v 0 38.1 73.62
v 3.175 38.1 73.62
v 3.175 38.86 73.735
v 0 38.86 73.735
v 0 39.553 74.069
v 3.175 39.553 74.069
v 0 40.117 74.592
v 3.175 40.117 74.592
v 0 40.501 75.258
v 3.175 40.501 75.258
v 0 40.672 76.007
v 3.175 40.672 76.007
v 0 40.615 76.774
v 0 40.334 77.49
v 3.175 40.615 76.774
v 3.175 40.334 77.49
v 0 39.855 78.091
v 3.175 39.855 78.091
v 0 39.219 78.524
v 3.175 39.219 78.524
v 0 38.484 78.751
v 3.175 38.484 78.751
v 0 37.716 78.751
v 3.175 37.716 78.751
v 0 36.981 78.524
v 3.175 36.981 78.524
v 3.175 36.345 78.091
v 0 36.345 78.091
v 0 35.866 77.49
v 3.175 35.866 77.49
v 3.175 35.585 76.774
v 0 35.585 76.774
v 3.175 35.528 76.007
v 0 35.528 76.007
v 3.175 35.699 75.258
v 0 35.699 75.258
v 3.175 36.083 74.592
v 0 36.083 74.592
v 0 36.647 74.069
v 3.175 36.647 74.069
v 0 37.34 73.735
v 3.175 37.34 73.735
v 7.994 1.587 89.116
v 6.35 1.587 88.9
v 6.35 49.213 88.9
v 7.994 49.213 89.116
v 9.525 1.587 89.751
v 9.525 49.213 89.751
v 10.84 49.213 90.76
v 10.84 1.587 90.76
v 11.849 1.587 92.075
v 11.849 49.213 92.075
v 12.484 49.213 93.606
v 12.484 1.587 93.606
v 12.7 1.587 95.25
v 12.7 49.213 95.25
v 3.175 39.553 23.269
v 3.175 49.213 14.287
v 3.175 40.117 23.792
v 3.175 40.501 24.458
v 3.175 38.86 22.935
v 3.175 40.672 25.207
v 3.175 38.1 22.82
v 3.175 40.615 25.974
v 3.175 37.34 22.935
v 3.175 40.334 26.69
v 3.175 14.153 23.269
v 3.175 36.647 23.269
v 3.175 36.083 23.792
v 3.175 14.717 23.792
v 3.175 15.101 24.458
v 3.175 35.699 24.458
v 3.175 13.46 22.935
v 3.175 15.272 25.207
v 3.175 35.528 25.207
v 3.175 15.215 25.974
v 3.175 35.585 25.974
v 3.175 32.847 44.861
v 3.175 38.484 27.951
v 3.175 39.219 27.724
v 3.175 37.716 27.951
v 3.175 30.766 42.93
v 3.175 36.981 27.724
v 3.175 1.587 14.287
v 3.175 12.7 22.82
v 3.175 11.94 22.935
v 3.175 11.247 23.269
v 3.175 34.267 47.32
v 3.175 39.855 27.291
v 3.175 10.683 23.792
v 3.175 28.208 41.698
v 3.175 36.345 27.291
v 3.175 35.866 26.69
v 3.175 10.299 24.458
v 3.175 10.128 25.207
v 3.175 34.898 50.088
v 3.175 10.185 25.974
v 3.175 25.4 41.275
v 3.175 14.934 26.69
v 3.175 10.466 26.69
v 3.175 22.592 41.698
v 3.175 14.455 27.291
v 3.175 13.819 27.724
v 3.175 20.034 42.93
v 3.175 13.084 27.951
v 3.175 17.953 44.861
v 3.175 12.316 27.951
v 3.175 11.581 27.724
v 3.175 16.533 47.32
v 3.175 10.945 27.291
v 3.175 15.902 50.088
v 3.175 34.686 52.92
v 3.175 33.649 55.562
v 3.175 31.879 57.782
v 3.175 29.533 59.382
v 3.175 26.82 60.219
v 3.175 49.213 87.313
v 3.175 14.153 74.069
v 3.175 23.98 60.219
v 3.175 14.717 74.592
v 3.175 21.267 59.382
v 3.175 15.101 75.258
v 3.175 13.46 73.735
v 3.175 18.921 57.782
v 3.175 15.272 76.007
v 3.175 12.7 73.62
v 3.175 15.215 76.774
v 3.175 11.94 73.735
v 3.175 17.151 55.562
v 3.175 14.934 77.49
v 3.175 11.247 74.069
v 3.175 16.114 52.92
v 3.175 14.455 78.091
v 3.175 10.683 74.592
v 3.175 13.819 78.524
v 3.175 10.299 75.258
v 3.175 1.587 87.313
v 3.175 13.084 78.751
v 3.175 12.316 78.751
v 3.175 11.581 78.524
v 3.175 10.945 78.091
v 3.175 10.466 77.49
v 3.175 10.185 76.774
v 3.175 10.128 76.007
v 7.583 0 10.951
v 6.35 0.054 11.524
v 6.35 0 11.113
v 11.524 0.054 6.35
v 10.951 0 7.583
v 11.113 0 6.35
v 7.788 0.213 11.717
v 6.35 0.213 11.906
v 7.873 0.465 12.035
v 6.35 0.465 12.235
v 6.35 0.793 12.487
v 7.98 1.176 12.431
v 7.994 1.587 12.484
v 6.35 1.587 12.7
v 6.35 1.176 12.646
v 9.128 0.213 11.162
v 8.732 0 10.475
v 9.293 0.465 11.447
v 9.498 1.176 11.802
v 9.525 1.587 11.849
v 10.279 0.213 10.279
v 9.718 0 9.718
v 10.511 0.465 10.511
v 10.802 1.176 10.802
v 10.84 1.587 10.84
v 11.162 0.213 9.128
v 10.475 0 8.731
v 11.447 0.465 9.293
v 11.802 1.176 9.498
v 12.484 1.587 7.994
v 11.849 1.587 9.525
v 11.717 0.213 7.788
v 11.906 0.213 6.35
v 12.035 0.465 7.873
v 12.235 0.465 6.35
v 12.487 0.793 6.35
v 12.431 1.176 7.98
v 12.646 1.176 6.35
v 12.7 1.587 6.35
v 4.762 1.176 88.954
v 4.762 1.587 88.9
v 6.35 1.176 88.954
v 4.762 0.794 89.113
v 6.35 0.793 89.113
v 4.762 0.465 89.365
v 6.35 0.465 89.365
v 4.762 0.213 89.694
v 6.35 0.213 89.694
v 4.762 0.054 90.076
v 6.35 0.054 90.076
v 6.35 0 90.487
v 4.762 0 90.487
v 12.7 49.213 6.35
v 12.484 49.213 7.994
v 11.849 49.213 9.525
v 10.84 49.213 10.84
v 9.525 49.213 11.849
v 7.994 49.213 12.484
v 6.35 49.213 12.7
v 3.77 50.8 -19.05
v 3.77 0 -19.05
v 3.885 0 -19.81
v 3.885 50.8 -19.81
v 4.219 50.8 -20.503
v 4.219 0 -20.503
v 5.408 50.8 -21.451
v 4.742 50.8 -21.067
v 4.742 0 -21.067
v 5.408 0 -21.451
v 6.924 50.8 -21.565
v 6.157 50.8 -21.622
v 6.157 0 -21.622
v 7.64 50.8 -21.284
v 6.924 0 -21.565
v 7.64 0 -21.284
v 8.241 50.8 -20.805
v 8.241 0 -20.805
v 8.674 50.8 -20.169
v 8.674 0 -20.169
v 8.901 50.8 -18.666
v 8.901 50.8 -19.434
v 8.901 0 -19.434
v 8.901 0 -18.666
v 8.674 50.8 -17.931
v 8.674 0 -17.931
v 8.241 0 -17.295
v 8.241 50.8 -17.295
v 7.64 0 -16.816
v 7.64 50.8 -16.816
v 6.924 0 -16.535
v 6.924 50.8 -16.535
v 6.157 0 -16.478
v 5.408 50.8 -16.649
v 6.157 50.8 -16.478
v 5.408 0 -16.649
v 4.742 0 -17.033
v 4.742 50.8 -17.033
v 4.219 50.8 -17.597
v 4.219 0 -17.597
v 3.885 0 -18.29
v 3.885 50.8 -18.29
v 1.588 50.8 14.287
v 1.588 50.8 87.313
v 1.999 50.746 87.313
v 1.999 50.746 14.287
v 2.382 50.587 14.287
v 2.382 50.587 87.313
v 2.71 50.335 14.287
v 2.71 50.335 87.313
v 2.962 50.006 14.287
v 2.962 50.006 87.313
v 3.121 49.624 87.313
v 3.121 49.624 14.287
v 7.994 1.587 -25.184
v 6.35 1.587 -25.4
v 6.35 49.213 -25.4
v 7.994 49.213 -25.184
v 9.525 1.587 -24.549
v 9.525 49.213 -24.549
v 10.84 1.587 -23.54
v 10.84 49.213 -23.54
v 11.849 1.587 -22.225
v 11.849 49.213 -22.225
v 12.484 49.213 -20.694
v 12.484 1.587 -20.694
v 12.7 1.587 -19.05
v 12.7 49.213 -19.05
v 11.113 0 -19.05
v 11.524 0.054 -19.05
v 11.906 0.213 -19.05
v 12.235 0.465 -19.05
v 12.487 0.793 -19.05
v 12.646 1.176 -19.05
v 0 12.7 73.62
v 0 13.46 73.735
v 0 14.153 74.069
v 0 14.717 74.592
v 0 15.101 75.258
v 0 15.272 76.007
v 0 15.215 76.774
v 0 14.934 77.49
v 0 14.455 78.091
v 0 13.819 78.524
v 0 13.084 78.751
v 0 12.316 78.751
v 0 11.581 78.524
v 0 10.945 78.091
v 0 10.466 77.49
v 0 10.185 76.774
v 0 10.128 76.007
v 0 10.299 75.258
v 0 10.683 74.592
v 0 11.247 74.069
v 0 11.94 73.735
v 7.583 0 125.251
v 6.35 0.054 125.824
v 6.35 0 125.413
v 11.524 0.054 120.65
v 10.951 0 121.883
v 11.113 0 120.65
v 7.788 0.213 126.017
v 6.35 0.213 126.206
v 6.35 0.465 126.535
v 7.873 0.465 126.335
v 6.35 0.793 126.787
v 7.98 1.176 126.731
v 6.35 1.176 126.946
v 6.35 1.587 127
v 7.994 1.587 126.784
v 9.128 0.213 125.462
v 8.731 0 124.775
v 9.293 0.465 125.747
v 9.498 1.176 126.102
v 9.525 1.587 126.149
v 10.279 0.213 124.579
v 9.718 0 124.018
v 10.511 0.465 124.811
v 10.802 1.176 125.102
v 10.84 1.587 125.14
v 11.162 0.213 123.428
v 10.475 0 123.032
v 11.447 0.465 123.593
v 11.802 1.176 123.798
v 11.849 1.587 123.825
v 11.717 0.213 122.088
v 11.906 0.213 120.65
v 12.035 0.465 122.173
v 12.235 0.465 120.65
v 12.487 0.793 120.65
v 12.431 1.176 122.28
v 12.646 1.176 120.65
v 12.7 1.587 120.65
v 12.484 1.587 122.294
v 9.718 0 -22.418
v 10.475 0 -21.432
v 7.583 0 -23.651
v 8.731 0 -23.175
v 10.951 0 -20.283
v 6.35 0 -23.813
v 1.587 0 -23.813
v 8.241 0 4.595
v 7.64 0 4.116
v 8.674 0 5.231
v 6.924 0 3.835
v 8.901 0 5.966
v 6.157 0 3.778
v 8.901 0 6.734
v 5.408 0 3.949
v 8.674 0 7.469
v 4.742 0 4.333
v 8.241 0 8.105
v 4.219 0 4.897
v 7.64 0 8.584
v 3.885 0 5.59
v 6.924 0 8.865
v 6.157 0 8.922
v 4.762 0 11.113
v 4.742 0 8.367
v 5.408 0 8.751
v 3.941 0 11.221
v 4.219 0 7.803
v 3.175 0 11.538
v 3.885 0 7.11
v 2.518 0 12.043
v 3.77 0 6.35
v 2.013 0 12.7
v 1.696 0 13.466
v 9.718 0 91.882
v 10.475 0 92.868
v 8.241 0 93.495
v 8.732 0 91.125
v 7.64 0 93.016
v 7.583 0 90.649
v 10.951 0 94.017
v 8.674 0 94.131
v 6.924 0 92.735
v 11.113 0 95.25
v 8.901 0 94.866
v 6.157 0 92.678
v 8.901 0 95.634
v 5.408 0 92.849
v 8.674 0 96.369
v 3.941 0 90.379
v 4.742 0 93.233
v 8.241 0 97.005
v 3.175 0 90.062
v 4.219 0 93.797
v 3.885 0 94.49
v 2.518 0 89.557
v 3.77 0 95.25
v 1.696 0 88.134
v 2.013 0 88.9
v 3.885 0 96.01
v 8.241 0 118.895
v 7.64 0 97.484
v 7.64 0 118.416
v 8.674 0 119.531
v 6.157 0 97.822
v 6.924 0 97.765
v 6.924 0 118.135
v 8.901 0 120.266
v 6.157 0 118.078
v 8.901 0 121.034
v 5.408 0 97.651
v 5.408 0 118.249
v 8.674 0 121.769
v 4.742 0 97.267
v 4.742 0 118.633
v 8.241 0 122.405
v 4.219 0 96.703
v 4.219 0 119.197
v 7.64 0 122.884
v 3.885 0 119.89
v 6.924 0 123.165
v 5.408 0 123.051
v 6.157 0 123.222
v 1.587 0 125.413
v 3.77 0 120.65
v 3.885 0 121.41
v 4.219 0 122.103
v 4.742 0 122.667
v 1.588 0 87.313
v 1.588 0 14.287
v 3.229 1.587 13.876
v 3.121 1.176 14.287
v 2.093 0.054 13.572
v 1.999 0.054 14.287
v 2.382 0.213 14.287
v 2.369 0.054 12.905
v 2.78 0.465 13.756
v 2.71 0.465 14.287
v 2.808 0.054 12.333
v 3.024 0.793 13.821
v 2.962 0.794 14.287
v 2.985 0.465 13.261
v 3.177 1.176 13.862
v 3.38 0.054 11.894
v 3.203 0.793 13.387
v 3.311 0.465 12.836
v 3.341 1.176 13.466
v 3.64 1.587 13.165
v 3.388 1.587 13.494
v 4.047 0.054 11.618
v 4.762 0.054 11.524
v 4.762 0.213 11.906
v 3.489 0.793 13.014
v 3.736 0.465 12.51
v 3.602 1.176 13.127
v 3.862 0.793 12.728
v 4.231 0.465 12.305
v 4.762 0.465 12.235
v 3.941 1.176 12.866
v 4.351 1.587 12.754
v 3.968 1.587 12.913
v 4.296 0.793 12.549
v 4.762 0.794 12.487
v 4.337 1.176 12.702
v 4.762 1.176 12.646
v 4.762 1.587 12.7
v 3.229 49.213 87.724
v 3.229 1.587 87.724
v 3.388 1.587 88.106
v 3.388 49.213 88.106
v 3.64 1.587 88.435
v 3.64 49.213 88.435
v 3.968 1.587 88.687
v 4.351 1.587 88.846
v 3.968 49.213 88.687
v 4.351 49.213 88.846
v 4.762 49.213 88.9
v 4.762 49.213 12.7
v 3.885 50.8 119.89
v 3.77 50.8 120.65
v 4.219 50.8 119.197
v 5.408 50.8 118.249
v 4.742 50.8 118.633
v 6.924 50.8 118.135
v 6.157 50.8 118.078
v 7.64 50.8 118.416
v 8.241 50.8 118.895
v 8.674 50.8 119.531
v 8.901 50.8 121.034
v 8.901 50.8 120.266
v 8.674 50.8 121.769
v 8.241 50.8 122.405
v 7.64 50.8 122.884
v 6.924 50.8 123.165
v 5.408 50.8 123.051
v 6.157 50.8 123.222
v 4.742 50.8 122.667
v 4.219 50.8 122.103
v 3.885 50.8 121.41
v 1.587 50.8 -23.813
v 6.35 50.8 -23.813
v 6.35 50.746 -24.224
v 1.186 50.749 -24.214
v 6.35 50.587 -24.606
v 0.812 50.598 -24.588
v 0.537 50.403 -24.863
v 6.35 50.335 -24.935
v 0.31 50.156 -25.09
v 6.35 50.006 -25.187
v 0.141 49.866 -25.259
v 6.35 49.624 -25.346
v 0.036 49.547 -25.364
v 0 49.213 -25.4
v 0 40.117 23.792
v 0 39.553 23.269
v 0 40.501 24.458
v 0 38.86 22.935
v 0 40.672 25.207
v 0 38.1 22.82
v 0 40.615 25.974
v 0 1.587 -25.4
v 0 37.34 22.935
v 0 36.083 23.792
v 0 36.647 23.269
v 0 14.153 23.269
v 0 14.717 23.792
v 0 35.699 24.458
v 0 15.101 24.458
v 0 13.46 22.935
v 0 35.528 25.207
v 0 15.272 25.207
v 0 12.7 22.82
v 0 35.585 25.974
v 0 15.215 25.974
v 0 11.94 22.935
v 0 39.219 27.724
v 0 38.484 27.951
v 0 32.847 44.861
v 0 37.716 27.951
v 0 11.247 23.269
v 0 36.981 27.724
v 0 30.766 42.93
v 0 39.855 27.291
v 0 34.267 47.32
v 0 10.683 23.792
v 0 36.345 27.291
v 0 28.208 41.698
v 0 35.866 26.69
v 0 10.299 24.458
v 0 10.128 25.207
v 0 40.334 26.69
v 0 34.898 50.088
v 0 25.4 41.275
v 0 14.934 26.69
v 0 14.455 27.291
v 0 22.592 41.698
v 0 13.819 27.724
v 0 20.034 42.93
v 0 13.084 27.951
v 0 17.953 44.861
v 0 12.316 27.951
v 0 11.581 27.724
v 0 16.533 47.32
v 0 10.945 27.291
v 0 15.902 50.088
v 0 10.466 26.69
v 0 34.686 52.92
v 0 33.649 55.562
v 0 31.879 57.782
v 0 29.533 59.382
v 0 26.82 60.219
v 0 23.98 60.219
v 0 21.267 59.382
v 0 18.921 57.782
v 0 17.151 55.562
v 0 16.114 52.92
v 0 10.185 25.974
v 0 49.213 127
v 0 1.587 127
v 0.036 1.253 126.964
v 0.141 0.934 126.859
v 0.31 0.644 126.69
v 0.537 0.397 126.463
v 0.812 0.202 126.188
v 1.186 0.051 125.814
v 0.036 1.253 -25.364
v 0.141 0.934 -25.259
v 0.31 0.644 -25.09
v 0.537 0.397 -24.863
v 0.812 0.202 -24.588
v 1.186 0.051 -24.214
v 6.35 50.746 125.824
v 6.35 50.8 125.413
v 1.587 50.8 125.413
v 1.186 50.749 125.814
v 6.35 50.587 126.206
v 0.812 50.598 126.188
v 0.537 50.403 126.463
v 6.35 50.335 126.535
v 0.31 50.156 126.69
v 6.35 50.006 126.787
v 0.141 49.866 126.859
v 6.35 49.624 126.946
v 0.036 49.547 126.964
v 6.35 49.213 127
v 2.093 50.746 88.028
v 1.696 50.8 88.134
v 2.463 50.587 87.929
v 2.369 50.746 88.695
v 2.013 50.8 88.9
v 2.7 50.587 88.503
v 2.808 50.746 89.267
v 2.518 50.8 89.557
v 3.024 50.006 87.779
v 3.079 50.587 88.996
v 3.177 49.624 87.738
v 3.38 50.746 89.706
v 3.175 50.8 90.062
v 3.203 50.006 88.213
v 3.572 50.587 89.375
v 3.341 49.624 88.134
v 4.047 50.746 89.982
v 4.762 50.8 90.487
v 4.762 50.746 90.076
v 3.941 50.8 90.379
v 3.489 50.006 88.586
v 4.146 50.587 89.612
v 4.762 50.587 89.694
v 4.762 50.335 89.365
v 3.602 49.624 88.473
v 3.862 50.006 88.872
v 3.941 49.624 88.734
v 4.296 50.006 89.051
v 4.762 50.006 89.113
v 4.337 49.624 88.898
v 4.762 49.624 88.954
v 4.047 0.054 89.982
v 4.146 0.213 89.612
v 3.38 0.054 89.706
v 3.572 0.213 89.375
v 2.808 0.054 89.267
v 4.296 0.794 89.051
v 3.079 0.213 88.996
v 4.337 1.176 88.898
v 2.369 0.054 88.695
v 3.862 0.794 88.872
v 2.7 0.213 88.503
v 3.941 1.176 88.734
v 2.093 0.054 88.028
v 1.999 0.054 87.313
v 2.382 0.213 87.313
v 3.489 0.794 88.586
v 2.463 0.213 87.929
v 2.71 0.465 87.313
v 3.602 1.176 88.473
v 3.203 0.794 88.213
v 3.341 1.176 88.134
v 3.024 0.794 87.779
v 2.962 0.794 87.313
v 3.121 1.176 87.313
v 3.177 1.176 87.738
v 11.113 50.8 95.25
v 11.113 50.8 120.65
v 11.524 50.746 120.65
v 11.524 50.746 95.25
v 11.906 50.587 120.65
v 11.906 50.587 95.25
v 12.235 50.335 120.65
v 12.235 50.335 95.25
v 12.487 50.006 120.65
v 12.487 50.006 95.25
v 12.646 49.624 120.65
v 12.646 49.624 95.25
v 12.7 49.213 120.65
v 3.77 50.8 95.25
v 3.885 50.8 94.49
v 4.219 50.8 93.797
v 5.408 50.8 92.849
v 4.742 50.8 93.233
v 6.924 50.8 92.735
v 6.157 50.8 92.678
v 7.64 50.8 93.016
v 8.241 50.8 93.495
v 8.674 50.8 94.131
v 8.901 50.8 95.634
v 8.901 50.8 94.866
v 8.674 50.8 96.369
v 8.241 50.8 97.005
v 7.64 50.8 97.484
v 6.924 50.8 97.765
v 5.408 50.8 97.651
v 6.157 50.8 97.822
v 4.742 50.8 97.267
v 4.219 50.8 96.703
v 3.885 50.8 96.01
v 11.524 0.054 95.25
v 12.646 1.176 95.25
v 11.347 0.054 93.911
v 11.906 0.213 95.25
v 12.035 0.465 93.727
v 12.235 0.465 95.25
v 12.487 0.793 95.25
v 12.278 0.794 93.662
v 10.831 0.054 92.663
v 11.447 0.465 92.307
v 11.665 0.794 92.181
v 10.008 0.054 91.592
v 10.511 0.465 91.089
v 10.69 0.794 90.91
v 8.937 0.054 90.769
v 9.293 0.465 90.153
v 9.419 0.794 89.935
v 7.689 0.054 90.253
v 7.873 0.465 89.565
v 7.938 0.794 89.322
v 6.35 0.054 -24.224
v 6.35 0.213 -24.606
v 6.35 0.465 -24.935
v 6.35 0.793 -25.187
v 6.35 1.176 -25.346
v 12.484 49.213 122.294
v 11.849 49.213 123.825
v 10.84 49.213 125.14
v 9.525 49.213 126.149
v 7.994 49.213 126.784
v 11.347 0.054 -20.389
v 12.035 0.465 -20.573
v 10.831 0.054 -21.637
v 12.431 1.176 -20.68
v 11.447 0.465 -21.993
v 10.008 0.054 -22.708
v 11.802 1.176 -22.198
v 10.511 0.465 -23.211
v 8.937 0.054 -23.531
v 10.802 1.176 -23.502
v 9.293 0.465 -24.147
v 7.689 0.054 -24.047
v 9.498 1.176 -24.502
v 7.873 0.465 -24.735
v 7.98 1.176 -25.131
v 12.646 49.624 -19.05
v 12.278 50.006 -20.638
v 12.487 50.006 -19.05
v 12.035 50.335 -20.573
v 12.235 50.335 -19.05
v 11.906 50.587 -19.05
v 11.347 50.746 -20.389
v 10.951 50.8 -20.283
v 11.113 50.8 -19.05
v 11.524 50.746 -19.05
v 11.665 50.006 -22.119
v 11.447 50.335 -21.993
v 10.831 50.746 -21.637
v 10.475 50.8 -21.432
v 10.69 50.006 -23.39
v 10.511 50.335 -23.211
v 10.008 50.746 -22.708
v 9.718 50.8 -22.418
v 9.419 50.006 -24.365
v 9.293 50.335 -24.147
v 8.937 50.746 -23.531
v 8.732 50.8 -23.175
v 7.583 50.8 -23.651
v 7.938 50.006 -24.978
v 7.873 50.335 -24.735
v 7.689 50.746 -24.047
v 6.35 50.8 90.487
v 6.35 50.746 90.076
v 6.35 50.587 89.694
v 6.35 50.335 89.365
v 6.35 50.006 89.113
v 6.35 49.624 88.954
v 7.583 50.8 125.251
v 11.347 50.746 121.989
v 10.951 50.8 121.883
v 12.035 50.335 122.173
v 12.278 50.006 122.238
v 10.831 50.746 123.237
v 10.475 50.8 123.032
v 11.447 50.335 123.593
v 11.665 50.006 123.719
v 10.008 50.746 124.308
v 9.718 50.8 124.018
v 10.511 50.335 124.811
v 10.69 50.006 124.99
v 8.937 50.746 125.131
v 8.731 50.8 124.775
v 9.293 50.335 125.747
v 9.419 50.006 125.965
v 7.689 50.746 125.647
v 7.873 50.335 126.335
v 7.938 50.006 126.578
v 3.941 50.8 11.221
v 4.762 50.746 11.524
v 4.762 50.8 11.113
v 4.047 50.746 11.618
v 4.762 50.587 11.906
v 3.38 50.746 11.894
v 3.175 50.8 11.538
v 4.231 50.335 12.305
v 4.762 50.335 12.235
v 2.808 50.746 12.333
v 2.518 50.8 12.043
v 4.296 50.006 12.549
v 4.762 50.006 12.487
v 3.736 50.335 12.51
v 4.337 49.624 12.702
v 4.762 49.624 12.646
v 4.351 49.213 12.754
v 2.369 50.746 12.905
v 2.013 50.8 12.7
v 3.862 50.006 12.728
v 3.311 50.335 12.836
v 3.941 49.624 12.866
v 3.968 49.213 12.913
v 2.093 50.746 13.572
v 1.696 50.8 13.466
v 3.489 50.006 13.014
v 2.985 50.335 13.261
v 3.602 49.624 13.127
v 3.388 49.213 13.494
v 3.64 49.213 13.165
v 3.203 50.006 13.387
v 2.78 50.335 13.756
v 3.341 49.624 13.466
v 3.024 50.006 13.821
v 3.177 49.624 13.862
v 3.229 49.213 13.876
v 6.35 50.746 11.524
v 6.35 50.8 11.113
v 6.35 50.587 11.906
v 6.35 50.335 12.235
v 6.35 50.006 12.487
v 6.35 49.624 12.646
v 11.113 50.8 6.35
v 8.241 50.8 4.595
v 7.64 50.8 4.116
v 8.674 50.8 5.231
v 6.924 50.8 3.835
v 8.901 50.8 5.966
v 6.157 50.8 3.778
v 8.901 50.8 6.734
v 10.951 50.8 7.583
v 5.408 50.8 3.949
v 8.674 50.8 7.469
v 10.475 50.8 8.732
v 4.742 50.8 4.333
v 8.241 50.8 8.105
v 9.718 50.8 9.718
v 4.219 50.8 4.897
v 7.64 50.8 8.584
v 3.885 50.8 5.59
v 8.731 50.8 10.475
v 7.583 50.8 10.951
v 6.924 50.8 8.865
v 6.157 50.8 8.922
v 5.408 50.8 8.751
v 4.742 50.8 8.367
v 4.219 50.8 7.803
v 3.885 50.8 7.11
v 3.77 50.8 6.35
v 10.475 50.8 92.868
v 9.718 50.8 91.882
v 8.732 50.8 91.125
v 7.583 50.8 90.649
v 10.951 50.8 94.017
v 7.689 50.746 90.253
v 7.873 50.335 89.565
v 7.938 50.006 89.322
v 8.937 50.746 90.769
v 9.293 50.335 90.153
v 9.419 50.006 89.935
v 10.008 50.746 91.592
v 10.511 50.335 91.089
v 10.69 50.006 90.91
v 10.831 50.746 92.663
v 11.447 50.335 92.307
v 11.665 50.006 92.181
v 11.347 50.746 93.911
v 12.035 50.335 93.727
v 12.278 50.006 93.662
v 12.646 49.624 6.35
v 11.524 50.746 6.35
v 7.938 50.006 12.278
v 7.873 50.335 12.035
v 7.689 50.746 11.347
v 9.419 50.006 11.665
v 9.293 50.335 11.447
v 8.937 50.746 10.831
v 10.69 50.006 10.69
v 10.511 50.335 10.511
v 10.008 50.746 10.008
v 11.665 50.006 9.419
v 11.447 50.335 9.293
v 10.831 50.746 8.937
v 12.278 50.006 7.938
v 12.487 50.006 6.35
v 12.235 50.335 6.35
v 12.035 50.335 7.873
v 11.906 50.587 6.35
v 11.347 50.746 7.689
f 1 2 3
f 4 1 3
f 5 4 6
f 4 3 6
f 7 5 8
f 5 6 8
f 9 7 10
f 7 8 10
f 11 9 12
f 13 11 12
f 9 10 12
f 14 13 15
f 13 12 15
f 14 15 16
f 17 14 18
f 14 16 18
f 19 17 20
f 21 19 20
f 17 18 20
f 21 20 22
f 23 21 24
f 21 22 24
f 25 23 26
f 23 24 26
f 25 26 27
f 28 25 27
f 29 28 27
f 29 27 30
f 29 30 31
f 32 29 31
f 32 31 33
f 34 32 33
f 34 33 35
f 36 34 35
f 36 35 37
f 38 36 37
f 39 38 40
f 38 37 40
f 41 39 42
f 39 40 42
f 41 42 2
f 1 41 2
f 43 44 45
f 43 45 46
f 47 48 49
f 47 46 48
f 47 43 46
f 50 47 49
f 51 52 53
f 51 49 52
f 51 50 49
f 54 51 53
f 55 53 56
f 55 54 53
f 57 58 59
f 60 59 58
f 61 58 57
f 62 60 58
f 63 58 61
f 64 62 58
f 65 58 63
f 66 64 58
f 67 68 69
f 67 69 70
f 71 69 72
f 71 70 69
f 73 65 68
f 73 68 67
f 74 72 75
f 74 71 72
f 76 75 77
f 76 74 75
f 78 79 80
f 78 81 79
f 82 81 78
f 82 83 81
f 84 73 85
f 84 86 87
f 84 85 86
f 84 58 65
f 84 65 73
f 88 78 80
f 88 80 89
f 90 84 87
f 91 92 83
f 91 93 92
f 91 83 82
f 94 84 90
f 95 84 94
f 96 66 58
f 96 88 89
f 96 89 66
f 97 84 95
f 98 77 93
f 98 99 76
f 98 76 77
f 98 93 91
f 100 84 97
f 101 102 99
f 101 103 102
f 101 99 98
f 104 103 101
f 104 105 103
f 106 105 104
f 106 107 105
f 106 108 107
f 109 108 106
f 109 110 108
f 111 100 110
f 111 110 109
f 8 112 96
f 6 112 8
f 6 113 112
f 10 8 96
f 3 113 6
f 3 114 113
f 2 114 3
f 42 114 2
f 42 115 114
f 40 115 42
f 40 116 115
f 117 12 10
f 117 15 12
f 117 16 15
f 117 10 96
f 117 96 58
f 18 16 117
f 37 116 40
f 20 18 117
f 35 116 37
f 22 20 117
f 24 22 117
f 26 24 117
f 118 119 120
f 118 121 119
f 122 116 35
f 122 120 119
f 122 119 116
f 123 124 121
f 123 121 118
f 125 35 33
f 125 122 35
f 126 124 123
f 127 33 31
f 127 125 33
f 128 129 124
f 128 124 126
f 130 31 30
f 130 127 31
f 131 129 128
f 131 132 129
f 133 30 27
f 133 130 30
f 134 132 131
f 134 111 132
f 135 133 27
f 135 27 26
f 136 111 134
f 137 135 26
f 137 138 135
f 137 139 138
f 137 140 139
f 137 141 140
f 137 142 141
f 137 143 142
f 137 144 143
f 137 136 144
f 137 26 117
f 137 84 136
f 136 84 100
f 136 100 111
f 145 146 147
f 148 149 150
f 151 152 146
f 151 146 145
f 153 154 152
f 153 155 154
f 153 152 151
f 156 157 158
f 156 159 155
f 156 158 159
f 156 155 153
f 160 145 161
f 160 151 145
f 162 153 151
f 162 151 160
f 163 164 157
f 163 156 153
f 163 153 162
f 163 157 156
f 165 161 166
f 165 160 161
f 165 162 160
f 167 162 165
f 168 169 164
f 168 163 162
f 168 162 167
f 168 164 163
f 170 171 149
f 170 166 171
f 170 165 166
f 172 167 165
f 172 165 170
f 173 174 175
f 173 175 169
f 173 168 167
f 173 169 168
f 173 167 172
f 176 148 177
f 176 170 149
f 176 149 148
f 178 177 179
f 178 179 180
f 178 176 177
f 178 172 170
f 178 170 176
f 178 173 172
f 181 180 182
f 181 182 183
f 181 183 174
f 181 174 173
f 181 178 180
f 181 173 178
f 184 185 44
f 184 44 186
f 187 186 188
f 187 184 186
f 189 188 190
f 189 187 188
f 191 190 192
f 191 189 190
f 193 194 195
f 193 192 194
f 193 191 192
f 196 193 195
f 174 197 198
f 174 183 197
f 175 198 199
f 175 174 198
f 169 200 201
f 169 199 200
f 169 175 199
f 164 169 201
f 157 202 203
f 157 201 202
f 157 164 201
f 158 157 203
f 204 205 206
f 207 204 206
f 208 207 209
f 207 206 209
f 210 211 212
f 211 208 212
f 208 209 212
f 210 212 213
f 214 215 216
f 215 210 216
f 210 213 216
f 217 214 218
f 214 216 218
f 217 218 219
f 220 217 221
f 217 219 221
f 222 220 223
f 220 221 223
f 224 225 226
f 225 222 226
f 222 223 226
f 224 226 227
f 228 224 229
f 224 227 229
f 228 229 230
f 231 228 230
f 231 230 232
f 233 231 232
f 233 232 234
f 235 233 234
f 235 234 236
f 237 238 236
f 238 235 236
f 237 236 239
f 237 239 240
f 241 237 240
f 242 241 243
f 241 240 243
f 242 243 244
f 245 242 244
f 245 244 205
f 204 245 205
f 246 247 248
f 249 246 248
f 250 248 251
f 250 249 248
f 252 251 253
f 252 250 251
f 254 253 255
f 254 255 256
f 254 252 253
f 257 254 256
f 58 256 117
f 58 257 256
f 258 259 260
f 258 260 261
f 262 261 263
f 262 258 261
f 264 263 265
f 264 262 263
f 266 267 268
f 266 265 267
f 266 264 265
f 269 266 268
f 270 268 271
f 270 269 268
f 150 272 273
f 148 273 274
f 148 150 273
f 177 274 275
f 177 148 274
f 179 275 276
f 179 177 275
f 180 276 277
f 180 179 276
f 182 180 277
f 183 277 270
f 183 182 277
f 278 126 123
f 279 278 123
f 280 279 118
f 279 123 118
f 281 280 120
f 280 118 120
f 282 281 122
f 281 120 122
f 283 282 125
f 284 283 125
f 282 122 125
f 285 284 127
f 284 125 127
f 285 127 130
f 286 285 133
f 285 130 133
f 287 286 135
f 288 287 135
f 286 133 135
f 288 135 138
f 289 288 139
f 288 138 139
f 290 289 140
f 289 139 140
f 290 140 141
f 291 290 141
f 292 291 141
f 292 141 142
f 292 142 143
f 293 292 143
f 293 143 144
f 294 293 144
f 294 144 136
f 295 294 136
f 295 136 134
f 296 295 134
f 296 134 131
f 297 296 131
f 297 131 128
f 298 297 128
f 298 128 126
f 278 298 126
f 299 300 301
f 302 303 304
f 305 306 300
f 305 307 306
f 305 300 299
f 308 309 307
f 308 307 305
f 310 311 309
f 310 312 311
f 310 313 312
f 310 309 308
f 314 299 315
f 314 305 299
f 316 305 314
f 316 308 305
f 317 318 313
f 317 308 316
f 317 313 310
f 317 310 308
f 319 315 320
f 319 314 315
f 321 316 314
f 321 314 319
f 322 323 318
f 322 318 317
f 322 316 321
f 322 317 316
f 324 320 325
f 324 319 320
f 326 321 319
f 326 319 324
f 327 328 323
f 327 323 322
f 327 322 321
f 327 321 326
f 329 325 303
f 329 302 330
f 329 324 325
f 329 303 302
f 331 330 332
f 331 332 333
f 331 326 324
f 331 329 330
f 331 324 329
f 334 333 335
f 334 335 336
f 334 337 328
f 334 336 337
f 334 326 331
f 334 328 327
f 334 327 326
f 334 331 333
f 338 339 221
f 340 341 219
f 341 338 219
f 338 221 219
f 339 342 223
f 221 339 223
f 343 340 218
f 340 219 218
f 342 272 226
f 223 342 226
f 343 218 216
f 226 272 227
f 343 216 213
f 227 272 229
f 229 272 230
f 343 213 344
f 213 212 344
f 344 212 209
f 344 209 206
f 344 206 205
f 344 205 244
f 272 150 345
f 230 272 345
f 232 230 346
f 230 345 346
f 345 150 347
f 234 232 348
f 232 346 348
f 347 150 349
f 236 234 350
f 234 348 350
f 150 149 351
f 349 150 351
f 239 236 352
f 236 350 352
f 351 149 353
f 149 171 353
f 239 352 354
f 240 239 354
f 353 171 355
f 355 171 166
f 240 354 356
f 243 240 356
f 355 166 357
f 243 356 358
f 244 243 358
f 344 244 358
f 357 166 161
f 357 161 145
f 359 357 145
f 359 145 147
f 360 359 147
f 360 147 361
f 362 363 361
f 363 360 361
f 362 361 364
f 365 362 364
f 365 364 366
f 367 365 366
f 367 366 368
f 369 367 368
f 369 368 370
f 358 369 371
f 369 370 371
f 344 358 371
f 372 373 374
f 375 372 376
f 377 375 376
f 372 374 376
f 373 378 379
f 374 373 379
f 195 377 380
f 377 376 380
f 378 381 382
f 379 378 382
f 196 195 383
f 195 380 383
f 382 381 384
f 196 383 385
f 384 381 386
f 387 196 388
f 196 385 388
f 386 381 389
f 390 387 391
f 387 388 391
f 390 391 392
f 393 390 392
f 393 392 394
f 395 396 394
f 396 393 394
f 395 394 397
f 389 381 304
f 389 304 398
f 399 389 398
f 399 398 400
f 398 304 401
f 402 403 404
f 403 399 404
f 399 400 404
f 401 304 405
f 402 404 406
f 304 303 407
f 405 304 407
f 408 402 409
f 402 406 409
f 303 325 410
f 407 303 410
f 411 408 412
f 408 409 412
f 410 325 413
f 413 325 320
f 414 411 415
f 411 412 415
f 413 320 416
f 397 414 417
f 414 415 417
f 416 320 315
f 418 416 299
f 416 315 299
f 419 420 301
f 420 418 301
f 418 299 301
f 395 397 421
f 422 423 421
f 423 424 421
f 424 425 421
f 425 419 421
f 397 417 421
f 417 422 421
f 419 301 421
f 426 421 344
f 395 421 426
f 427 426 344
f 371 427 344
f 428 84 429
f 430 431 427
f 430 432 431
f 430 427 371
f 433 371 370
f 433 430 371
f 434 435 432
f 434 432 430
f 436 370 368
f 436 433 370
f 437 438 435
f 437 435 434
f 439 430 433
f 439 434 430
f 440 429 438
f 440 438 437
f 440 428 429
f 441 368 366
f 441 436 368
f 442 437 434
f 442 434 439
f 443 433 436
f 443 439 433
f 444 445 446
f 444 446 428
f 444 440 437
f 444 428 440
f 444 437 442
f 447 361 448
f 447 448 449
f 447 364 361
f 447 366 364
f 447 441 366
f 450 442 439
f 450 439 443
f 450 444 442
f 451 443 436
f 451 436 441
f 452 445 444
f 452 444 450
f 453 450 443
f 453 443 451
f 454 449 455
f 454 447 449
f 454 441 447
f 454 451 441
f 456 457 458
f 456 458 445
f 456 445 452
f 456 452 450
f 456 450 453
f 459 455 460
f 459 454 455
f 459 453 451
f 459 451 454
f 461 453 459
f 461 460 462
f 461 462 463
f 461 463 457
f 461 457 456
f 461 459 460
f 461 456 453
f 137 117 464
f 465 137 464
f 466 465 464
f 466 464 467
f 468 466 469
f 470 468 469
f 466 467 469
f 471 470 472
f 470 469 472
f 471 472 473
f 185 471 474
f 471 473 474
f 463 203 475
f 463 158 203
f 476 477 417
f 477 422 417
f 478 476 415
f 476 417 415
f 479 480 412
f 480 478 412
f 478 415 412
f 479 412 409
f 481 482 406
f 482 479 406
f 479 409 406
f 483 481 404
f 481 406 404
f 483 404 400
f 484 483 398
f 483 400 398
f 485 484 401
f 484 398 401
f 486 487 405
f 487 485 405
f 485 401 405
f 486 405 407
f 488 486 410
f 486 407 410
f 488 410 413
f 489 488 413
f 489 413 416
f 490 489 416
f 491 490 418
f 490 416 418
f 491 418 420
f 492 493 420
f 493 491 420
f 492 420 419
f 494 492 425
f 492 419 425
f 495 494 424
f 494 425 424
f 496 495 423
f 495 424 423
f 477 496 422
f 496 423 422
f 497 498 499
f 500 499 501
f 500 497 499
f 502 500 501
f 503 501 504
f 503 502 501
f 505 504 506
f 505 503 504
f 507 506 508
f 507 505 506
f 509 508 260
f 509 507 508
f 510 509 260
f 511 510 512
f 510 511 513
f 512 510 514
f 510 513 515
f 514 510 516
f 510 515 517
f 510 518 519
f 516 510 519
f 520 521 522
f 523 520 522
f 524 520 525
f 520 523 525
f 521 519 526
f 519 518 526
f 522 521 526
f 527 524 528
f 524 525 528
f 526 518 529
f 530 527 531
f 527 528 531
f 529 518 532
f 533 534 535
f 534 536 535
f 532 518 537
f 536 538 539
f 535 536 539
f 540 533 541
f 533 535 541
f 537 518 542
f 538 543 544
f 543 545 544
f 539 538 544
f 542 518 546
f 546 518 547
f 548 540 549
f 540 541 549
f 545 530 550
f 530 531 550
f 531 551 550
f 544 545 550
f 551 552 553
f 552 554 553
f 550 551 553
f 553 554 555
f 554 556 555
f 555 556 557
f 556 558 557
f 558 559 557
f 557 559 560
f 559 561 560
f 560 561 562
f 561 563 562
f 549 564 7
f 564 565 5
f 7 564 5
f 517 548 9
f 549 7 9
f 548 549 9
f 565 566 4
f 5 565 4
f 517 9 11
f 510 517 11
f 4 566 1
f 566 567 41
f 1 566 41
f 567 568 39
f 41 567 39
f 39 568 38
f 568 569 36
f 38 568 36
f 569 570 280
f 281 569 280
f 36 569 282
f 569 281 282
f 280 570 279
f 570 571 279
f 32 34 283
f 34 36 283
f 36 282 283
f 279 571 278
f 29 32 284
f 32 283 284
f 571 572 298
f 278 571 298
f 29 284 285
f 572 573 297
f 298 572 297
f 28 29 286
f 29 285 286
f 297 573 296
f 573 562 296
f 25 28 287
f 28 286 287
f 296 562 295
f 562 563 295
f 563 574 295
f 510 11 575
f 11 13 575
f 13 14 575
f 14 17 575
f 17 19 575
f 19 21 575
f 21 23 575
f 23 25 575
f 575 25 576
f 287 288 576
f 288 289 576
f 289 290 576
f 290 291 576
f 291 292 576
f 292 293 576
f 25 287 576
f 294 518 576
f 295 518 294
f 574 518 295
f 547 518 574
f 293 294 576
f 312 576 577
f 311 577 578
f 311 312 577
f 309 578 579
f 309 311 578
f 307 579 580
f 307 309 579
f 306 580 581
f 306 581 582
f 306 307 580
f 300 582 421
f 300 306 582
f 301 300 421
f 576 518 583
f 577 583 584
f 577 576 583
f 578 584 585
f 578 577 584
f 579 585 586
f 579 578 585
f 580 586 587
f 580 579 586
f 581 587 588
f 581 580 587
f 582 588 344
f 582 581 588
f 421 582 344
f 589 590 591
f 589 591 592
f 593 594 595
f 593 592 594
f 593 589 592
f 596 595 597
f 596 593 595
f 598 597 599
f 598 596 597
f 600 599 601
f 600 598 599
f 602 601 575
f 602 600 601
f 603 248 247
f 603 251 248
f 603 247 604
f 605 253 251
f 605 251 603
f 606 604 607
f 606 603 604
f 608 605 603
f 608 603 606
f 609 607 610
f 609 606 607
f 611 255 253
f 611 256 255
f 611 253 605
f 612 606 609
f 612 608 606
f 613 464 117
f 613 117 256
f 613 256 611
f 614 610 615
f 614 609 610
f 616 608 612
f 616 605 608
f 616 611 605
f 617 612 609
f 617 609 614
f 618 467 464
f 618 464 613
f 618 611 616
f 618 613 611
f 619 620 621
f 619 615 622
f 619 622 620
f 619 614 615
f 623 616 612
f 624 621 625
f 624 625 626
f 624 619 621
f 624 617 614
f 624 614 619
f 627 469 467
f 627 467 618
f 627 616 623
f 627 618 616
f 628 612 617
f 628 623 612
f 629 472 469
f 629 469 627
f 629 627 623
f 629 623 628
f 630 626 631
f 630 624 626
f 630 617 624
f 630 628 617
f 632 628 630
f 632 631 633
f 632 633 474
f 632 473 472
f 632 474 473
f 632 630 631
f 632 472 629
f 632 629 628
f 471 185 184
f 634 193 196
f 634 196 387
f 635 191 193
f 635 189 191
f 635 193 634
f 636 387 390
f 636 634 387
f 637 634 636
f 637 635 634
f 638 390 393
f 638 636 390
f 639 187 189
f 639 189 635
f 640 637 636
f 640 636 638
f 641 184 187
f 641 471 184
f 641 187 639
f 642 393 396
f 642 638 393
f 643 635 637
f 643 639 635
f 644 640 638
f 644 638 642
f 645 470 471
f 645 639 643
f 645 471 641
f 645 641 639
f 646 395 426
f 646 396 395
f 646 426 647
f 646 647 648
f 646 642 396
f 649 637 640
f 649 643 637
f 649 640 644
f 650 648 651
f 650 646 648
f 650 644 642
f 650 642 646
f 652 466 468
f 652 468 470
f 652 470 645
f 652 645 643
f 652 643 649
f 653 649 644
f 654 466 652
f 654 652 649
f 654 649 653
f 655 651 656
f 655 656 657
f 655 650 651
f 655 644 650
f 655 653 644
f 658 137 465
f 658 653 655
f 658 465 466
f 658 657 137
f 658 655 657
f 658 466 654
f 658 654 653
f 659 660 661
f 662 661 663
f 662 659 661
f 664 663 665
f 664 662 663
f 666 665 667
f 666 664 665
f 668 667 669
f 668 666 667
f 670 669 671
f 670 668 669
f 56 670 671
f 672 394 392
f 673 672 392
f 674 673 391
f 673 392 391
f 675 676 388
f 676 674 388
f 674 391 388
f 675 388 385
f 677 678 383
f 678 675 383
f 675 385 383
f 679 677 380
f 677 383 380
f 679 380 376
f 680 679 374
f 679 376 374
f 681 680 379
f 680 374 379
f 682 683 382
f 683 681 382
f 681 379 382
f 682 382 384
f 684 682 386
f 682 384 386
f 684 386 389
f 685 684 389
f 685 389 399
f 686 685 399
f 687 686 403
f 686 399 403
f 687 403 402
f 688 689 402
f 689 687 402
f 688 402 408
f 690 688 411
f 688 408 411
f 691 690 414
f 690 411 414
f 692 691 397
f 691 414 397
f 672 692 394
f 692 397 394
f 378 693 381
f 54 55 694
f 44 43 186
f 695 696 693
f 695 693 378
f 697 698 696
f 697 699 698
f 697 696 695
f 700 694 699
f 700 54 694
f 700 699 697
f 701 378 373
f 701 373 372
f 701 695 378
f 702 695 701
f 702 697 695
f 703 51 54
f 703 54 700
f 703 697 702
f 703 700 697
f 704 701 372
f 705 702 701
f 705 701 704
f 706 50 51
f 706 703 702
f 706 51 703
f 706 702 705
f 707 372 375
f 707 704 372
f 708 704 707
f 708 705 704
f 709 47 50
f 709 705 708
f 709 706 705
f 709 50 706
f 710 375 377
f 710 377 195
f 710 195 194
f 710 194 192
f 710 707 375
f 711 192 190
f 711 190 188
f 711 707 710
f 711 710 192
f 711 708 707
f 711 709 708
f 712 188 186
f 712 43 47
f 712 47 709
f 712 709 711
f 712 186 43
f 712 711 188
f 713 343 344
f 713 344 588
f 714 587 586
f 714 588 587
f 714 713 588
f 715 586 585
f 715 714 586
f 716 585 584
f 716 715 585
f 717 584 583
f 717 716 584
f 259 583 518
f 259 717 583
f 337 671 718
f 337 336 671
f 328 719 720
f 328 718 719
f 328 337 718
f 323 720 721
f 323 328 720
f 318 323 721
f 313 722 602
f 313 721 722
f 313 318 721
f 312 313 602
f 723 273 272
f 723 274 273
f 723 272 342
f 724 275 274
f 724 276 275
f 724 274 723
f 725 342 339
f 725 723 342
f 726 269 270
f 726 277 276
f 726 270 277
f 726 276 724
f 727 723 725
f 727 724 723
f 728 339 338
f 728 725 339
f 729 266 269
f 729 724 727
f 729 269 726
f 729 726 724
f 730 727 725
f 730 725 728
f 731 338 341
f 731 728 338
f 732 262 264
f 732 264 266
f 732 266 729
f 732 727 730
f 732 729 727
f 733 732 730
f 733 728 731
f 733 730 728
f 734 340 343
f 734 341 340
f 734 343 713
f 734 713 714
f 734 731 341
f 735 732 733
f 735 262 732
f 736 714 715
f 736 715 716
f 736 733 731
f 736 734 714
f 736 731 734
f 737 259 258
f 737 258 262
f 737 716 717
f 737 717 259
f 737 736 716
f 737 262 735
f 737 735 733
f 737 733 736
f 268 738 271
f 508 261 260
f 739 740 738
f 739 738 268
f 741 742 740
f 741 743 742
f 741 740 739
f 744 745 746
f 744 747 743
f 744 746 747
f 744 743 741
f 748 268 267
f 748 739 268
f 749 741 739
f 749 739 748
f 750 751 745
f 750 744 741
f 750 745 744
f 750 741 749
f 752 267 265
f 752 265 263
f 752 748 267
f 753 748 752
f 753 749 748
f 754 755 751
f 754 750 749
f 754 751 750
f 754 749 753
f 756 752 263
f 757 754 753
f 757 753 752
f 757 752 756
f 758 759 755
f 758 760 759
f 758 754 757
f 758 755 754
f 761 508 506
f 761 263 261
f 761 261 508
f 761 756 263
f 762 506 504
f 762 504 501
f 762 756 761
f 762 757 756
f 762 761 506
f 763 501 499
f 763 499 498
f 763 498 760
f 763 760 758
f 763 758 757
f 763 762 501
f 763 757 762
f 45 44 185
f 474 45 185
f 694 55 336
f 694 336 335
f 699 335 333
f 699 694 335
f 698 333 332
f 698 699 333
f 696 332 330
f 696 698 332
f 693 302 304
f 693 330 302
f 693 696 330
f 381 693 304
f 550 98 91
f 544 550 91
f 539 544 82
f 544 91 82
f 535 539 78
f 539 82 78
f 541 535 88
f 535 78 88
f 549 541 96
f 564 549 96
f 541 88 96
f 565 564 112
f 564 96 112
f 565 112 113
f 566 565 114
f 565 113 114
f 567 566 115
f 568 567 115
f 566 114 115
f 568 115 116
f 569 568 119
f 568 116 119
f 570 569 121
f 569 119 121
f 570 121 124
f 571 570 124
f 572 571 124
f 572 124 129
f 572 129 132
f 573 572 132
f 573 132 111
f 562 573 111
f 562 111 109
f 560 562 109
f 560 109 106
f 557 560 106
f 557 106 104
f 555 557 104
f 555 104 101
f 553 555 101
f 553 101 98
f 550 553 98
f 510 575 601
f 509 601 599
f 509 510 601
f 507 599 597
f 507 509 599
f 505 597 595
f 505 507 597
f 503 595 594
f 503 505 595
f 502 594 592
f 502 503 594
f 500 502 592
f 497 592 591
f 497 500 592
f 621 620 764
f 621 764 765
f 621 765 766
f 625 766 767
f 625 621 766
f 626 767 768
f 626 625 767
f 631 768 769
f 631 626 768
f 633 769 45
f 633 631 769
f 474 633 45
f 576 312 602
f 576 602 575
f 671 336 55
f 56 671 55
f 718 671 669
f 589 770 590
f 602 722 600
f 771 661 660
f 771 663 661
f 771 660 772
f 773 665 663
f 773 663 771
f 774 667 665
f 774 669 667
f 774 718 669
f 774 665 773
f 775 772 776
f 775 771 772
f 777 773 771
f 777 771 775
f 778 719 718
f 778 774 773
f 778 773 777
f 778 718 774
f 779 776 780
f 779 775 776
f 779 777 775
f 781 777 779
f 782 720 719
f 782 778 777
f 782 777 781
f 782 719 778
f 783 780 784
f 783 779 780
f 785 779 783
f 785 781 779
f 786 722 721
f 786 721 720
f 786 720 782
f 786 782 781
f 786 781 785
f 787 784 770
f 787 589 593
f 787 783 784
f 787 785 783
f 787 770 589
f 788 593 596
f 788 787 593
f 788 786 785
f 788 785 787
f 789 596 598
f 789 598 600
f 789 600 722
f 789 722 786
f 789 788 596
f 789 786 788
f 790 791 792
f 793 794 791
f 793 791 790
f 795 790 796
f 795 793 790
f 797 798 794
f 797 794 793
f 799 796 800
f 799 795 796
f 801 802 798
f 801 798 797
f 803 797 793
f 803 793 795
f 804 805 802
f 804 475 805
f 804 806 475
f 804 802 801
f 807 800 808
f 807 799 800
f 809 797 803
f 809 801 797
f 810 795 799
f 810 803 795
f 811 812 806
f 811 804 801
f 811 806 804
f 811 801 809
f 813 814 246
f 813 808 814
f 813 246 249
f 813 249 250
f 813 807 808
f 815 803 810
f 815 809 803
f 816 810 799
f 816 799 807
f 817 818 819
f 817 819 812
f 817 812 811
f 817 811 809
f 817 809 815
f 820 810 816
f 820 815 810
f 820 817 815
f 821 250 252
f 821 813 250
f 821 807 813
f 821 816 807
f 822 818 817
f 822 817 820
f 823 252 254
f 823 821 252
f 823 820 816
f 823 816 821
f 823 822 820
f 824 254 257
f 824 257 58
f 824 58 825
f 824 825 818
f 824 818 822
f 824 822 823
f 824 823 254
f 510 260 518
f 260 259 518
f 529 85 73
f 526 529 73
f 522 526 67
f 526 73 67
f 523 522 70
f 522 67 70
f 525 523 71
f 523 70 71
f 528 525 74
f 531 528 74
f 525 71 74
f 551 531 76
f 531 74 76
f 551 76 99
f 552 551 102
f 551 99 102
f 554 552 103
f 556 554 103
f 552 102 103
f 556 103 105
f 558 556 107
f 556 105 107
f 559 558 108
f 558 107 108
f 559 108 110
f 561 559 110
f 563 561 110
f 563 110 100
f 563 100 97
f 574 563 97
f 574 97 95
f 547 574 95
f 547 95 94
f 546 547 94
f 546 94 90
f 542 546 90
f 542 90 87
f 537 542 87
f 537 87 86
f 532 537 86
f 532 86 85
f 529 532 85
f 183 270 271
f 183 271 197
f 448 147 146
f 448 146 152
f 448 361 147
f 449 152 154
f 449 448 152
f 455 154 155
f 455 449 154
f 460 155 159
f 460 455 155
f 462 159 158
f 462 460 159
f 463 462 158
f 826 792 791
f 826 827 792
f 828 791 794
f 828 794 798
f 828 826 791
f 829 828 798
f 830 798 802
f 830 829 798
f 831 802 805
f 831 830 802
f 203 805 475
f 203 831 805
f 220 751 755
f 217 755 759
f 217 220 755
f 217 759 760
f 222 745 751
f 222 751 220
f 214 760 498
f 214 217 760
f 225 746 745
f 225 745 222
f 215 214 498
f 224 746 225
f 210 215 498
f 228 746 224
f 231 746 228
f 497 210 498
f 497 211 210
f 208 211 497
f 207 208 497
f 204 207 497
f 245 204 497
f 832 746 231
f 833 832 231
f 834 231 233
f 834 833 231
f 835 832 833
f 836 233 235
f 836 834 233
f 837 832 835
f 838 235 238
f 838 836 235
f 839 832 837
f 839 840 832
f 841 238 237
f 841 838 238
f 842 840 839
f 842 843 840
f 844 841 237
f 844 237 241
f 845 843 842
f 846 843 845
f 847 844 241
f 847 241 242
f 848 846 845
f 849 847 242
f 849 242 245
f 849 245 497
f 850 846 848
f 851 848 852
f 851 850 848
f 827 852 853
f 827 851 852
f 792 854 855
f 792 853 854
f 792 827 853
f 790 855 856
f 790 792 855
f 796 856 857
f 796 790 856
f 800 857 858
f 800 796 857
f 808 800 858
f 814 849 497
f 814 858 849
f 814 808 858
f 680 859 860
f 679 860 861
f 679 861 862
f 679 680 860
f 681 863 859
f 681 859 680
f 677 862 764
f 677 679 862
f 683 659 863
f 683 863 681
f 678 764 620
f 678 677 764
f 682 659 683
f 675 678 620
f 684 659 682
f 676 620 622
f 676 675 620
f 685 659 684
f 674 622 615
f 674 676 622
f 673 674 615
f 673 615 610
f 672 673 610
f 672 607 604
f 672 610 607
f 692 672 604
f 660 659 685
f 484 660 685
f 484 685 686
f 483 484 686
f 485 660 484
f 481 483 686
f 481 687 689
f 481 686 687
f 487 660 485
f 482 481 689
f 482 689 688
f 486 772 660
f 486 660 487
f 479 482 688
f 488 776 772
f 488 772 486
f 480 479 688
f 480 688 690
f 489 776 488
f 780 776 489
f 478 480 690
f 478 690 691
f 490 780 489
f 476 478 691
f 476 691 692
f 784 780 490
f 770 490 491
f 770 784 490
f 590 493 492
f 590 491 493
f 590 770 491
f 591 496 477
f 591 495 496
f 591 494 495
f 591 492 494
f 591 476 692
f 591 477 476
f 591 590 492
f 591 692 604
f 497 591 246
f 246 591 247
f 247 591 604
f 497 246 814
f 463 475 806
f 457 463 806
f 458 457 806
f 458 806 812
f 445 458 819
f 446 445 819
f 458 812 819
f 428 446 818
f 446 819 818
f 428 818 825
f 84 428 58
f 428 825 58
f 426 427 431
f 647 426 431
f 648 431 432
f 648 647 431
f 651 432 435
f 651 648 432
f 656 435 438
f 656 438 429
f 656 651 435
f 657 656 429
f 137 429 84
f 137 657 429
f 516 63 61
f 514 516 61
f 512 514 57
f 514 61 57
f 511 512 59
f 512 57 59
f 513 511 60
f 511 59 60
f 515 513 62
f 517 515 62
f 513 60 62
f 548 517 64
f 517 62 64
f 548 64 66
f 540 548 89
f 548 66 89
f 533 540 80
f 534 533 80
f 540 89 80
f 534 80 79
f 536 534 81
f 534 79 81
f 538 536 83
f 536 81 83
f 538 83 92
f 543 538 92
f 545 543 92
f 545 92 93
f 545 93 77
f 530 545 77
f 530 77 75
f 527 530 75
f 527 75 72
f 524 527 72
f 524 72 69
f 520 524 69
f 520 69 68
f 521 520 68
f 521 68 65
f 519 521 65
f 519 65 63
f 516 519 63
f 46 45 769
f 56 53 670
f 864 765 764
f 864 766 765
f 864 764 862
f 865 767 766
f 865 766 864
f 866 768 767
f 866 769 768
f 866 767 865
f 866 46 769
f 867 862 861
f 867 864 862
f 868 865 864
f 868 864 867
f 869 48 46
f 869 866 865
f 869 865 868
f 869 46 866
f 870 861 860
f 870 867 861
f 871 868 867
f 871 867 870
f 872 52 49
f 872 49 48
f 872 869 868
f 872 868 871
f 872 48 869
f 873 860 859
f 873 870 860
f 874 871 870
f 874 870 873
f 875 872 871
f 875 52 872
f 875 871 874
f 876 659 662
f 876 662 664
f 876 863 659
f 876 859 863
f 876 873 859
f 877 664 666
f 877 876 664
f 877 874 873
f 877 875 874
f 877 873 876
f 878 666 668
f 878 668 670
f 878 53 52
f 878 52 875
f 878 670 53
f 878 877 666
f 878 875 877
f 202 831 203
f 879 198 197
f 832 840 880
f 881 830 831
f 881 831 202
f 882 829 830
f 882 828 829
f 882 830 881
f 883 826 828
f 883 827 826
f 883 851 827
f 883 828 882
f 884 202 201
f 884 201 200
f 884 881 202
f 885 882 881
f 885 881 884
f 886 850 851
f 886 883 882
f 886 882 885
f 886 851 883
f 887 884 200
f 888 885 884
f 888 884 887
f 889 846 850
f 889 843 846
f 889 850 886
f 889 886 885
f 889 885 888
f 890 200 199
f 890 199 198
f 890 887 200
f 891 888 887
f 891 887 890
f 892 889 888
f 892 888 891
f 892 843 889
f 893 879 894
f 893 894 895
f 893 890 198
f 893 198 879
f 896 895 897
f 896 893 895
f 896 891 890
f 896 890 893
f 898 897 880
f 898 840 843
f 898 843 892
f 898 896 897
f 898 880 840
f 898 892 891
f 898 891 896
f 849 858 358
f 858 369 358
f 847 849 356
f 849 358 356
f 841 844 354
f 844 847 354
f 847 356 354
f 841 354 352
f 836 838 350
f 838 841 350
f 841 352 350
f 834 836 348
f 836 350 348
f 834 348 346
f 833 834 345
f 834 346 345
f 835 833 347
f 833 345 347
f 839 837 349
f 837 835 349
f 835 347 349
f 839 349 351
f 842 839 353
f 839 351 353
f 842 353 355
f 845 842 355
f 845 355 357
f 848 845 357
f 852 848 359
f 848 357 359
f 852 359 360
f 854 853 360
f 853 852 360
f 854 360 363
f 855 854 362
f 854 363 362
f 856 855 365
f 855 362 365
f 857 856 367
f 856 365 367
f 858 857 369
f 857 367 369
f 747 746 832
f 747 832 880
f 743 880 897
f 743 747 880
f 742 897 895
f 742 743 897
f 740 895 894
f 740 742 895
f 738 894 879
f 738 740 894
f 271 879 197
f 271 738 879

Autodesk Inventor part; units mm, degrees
ref_plane "YZ Plane" through (0, 0, 0) normal (1, 0, 0) x (0, 1, 0)
ref_plane "XZ Plane" through (0, 0, 0) normal (0, 1, 0) x (-1, 0, 0)
ref_plane "XY Plane" through (0, 0, 0) normal (0, 0, 1) x (1, 0, 0)
sketch "Sketch1" plane through (0, 0, 0) normal (0, 1, 0) x (-1, 0, 0)
  line L0 (0, 0) -> (-3.175, 0)
  line L1 (-3.175, 0) -> (-3.175, 101.6)
  line L2 (-3.175, 101.6) -> (0, 101.6)
  line L3 (0, 101.6) -> (0, 0)
  line L4 (0, 0) -> (-3.175, 0)
  line L5 (-3.175, 0) -> (-3.175, -25.4)
  line L6 (-3.175, -25.4) -> (0, -25.4)
  line L7 (0, -25.4) -> (0, 0)
  line L8 (0, 101.6) -> (-3.175, 101.6)
  line L9 (-3.175, 101.6) -> (-3.175, 127)
  line L10 (-3.175, 127) -> (0, 127)
  line L11 (0, 127) -> (0, 101.6)
  circle A0 centre (-6.35, 120.65) radius 2.5797
  circle A1 centre (-6.35, 95.25) radius 2.5797
  line L12 (0, 127) -> (-12.7, 127)
  line L13 (-12.7, 127) -> (-12.7, 88.9)
  line L14 (-12.7, 88.9) -> (0, 88.9)
  line L15 (0, 88.9) -> (0, 127)
  line L16 (25.4, 50.8) -> (-25.4, 50.8)
  line L17 (25.4, 50.8) -> (76.2, 50.8) construction
  line L18 (-3.175, 101.6) -> (-3.175, 0)
  line L19 (-3.175, 0) -> (0, 0)
  line L20 (0, 0) -> (0, 101.6)
  line L21 (0, 0) -> (-3.175, 0)
  line L22 (-3.175, 0) -> (-3.175, -25.4)
  line L23 (-3.175, -25.4) -> (0, -25.4)
  line L24 (0, -25.4) -> (0, 0)
  circle A2 centre (-6.35, -19.05) radius 2.5797
  circle A3 centre (-6.35, 6.35) radius 2.5797
  line L25 (0, -25.4) -> (-12.7, -25.4)
  line L26 (-12.7, -25.4) -> (-12.7, 12.7)
  line L27 (-12.7, 12.7) -> (0, 12.7)
  line L28 (0, 12.7) -> (0, -25.4)
  circle A4 centre (-6.35, 6.35) radius 6.35
  circle A5 centre (-6.35, -19.05) radius 6.35
  circle A6 centre (-6.35, 95.25) radius 6.35
  circle A7 centre (-6.35, 120.65) radius 6.35
  point P0 (-3.175, 88.9)
  point P1 (-3.175, 12.7)
  point P2 (-12.7, -19.05)
  point P3 (0, -19.05)
  point P4 (0, 120.65)
  point P5 (-3.175, 115.1507)
  point P6 (-3.175, 100.7493)
  point P7 (-6.35, 88.9)
  point P8 (-6.35, 12.7)
  point P9 (-12.7, 6.35)
  point P10 (-6.35, 127)
  point P11 (-12.7, 120.65)
  point P12 (-12.7, 95.25)
  point P13 (-6.35, -25.4)
  dimension "d25" = 3.175
  dimension "d26" = 101.6
  dimension "d27" = 3.175
  dimension "d28" = 25.4
  dimension "d29" = 3.175
  dimension "d30" = 25.4
  dimension "d31" = 0
  dimension "d32" = 25.4
  dimension "d33" = 6.35
  dimension "d34" = 5.1594
  dimension "d35" = 5.1594
  dimension "d36" = 12.7
  dimension "d37" = 38.1
  dimension "d38" = 6.35
  dimension "d39" = 50.8
  dimension "d40" = 180
  dimension "d41" = 50.8
  dimension "d42" = 25.4
extrude "Extrusion1" add sketch "Sketch1" along normal blind 50.8 contours L7 A5 L5 L0 | L0 L1 A4 L3 | L5 A5 L26 A4 L1 | A4 L1 L27 L3 | A4 L1 | A5 L5 | L7 L6 L5 A5 | A4 L1 | L5 A5 | L27 L1 L16 L3 | A4 L27 L1 | L5 L25 A5 | L16 L1 L14 L3 | L14 L1 A6 L3 | A6 L1 L2 L3 | A6 L1 | L14 A6 L1 | L2 L9 A7 L11 | A6 L13 A7 L9 L1 | L1 A6 | A7 L9 L10 L11 | A7 L9 | A7 L9 | A7 L12 L9
sketch "Sketch3" plane through (3.175, 0, 88.9) normal (1, 0, 0) x (0, 0, -1)
  circle A0 centre (12.7, 12.7) radius 2.5797
  line L0 (0, 0) -> (76.2, 0)
  line L1 (0, 0) -> (0, 50.8)
  circle A1 centre (63.5, 12.7) radius 2.5797
  circle A2 centre (12.7, 38.1) radius 2.5797
  circle A3 centre (63.5, 38.1) radius 2.5797
  circle A4 centre (38.1, 25.4) radius 9.525
  point P0 (88.9, 0)
  dimension "d43" = 12.7
  dimension "d44" = 12.7
  dimension "d45" = 5.1594
  dimension "d48" = 50.8
  dimension "d51" = 25.4
  dimension "d56" = 19.05
  dimension "d57" = 25.4
  dimension "d58" = 38.1
extrude "Extrusion3" cut sketch "Sketch3" against normal blind 50.8
fillet "Fillet3" radius 1.5875 26 edges at (0, 50.8, 50.8) (0, 0, 50.8) (10.8401, 50.8, 125.1401) (12.7, 50.8, 107.95) (10.8401, 50.8, 90.7599) (4.7625, 50.8, 88.9) (3.175, 50.8, 127) (10.8401, 0, 125.1401) (12.7, 0, 107.95) (10.8401, 0, 90.7599) (4.7625, 0, 88.9) (3.175, 0, 127) (3.175, 25.4, 88.9) (3.175, 50.8, 50.8) (3.175, 50.8, -25.4) (12.7, 50.8, -6.35) (10.8401, 50.8, 10.8401) (4.7625, 50.8, 12.7) (10.8401, 50.8, -23.5401) (3.175, 0, -25.4) (12.7, 0, -6.35) (10.8401, 0, 10.8401) (4.7625, 0, 12.7) (10.8401, 0, -23.5401) (3.175, 0, 50.8) (3.175, 25.4, 12.7)
equation "\"d35\" = d34"
properties part number "Connector plate"
